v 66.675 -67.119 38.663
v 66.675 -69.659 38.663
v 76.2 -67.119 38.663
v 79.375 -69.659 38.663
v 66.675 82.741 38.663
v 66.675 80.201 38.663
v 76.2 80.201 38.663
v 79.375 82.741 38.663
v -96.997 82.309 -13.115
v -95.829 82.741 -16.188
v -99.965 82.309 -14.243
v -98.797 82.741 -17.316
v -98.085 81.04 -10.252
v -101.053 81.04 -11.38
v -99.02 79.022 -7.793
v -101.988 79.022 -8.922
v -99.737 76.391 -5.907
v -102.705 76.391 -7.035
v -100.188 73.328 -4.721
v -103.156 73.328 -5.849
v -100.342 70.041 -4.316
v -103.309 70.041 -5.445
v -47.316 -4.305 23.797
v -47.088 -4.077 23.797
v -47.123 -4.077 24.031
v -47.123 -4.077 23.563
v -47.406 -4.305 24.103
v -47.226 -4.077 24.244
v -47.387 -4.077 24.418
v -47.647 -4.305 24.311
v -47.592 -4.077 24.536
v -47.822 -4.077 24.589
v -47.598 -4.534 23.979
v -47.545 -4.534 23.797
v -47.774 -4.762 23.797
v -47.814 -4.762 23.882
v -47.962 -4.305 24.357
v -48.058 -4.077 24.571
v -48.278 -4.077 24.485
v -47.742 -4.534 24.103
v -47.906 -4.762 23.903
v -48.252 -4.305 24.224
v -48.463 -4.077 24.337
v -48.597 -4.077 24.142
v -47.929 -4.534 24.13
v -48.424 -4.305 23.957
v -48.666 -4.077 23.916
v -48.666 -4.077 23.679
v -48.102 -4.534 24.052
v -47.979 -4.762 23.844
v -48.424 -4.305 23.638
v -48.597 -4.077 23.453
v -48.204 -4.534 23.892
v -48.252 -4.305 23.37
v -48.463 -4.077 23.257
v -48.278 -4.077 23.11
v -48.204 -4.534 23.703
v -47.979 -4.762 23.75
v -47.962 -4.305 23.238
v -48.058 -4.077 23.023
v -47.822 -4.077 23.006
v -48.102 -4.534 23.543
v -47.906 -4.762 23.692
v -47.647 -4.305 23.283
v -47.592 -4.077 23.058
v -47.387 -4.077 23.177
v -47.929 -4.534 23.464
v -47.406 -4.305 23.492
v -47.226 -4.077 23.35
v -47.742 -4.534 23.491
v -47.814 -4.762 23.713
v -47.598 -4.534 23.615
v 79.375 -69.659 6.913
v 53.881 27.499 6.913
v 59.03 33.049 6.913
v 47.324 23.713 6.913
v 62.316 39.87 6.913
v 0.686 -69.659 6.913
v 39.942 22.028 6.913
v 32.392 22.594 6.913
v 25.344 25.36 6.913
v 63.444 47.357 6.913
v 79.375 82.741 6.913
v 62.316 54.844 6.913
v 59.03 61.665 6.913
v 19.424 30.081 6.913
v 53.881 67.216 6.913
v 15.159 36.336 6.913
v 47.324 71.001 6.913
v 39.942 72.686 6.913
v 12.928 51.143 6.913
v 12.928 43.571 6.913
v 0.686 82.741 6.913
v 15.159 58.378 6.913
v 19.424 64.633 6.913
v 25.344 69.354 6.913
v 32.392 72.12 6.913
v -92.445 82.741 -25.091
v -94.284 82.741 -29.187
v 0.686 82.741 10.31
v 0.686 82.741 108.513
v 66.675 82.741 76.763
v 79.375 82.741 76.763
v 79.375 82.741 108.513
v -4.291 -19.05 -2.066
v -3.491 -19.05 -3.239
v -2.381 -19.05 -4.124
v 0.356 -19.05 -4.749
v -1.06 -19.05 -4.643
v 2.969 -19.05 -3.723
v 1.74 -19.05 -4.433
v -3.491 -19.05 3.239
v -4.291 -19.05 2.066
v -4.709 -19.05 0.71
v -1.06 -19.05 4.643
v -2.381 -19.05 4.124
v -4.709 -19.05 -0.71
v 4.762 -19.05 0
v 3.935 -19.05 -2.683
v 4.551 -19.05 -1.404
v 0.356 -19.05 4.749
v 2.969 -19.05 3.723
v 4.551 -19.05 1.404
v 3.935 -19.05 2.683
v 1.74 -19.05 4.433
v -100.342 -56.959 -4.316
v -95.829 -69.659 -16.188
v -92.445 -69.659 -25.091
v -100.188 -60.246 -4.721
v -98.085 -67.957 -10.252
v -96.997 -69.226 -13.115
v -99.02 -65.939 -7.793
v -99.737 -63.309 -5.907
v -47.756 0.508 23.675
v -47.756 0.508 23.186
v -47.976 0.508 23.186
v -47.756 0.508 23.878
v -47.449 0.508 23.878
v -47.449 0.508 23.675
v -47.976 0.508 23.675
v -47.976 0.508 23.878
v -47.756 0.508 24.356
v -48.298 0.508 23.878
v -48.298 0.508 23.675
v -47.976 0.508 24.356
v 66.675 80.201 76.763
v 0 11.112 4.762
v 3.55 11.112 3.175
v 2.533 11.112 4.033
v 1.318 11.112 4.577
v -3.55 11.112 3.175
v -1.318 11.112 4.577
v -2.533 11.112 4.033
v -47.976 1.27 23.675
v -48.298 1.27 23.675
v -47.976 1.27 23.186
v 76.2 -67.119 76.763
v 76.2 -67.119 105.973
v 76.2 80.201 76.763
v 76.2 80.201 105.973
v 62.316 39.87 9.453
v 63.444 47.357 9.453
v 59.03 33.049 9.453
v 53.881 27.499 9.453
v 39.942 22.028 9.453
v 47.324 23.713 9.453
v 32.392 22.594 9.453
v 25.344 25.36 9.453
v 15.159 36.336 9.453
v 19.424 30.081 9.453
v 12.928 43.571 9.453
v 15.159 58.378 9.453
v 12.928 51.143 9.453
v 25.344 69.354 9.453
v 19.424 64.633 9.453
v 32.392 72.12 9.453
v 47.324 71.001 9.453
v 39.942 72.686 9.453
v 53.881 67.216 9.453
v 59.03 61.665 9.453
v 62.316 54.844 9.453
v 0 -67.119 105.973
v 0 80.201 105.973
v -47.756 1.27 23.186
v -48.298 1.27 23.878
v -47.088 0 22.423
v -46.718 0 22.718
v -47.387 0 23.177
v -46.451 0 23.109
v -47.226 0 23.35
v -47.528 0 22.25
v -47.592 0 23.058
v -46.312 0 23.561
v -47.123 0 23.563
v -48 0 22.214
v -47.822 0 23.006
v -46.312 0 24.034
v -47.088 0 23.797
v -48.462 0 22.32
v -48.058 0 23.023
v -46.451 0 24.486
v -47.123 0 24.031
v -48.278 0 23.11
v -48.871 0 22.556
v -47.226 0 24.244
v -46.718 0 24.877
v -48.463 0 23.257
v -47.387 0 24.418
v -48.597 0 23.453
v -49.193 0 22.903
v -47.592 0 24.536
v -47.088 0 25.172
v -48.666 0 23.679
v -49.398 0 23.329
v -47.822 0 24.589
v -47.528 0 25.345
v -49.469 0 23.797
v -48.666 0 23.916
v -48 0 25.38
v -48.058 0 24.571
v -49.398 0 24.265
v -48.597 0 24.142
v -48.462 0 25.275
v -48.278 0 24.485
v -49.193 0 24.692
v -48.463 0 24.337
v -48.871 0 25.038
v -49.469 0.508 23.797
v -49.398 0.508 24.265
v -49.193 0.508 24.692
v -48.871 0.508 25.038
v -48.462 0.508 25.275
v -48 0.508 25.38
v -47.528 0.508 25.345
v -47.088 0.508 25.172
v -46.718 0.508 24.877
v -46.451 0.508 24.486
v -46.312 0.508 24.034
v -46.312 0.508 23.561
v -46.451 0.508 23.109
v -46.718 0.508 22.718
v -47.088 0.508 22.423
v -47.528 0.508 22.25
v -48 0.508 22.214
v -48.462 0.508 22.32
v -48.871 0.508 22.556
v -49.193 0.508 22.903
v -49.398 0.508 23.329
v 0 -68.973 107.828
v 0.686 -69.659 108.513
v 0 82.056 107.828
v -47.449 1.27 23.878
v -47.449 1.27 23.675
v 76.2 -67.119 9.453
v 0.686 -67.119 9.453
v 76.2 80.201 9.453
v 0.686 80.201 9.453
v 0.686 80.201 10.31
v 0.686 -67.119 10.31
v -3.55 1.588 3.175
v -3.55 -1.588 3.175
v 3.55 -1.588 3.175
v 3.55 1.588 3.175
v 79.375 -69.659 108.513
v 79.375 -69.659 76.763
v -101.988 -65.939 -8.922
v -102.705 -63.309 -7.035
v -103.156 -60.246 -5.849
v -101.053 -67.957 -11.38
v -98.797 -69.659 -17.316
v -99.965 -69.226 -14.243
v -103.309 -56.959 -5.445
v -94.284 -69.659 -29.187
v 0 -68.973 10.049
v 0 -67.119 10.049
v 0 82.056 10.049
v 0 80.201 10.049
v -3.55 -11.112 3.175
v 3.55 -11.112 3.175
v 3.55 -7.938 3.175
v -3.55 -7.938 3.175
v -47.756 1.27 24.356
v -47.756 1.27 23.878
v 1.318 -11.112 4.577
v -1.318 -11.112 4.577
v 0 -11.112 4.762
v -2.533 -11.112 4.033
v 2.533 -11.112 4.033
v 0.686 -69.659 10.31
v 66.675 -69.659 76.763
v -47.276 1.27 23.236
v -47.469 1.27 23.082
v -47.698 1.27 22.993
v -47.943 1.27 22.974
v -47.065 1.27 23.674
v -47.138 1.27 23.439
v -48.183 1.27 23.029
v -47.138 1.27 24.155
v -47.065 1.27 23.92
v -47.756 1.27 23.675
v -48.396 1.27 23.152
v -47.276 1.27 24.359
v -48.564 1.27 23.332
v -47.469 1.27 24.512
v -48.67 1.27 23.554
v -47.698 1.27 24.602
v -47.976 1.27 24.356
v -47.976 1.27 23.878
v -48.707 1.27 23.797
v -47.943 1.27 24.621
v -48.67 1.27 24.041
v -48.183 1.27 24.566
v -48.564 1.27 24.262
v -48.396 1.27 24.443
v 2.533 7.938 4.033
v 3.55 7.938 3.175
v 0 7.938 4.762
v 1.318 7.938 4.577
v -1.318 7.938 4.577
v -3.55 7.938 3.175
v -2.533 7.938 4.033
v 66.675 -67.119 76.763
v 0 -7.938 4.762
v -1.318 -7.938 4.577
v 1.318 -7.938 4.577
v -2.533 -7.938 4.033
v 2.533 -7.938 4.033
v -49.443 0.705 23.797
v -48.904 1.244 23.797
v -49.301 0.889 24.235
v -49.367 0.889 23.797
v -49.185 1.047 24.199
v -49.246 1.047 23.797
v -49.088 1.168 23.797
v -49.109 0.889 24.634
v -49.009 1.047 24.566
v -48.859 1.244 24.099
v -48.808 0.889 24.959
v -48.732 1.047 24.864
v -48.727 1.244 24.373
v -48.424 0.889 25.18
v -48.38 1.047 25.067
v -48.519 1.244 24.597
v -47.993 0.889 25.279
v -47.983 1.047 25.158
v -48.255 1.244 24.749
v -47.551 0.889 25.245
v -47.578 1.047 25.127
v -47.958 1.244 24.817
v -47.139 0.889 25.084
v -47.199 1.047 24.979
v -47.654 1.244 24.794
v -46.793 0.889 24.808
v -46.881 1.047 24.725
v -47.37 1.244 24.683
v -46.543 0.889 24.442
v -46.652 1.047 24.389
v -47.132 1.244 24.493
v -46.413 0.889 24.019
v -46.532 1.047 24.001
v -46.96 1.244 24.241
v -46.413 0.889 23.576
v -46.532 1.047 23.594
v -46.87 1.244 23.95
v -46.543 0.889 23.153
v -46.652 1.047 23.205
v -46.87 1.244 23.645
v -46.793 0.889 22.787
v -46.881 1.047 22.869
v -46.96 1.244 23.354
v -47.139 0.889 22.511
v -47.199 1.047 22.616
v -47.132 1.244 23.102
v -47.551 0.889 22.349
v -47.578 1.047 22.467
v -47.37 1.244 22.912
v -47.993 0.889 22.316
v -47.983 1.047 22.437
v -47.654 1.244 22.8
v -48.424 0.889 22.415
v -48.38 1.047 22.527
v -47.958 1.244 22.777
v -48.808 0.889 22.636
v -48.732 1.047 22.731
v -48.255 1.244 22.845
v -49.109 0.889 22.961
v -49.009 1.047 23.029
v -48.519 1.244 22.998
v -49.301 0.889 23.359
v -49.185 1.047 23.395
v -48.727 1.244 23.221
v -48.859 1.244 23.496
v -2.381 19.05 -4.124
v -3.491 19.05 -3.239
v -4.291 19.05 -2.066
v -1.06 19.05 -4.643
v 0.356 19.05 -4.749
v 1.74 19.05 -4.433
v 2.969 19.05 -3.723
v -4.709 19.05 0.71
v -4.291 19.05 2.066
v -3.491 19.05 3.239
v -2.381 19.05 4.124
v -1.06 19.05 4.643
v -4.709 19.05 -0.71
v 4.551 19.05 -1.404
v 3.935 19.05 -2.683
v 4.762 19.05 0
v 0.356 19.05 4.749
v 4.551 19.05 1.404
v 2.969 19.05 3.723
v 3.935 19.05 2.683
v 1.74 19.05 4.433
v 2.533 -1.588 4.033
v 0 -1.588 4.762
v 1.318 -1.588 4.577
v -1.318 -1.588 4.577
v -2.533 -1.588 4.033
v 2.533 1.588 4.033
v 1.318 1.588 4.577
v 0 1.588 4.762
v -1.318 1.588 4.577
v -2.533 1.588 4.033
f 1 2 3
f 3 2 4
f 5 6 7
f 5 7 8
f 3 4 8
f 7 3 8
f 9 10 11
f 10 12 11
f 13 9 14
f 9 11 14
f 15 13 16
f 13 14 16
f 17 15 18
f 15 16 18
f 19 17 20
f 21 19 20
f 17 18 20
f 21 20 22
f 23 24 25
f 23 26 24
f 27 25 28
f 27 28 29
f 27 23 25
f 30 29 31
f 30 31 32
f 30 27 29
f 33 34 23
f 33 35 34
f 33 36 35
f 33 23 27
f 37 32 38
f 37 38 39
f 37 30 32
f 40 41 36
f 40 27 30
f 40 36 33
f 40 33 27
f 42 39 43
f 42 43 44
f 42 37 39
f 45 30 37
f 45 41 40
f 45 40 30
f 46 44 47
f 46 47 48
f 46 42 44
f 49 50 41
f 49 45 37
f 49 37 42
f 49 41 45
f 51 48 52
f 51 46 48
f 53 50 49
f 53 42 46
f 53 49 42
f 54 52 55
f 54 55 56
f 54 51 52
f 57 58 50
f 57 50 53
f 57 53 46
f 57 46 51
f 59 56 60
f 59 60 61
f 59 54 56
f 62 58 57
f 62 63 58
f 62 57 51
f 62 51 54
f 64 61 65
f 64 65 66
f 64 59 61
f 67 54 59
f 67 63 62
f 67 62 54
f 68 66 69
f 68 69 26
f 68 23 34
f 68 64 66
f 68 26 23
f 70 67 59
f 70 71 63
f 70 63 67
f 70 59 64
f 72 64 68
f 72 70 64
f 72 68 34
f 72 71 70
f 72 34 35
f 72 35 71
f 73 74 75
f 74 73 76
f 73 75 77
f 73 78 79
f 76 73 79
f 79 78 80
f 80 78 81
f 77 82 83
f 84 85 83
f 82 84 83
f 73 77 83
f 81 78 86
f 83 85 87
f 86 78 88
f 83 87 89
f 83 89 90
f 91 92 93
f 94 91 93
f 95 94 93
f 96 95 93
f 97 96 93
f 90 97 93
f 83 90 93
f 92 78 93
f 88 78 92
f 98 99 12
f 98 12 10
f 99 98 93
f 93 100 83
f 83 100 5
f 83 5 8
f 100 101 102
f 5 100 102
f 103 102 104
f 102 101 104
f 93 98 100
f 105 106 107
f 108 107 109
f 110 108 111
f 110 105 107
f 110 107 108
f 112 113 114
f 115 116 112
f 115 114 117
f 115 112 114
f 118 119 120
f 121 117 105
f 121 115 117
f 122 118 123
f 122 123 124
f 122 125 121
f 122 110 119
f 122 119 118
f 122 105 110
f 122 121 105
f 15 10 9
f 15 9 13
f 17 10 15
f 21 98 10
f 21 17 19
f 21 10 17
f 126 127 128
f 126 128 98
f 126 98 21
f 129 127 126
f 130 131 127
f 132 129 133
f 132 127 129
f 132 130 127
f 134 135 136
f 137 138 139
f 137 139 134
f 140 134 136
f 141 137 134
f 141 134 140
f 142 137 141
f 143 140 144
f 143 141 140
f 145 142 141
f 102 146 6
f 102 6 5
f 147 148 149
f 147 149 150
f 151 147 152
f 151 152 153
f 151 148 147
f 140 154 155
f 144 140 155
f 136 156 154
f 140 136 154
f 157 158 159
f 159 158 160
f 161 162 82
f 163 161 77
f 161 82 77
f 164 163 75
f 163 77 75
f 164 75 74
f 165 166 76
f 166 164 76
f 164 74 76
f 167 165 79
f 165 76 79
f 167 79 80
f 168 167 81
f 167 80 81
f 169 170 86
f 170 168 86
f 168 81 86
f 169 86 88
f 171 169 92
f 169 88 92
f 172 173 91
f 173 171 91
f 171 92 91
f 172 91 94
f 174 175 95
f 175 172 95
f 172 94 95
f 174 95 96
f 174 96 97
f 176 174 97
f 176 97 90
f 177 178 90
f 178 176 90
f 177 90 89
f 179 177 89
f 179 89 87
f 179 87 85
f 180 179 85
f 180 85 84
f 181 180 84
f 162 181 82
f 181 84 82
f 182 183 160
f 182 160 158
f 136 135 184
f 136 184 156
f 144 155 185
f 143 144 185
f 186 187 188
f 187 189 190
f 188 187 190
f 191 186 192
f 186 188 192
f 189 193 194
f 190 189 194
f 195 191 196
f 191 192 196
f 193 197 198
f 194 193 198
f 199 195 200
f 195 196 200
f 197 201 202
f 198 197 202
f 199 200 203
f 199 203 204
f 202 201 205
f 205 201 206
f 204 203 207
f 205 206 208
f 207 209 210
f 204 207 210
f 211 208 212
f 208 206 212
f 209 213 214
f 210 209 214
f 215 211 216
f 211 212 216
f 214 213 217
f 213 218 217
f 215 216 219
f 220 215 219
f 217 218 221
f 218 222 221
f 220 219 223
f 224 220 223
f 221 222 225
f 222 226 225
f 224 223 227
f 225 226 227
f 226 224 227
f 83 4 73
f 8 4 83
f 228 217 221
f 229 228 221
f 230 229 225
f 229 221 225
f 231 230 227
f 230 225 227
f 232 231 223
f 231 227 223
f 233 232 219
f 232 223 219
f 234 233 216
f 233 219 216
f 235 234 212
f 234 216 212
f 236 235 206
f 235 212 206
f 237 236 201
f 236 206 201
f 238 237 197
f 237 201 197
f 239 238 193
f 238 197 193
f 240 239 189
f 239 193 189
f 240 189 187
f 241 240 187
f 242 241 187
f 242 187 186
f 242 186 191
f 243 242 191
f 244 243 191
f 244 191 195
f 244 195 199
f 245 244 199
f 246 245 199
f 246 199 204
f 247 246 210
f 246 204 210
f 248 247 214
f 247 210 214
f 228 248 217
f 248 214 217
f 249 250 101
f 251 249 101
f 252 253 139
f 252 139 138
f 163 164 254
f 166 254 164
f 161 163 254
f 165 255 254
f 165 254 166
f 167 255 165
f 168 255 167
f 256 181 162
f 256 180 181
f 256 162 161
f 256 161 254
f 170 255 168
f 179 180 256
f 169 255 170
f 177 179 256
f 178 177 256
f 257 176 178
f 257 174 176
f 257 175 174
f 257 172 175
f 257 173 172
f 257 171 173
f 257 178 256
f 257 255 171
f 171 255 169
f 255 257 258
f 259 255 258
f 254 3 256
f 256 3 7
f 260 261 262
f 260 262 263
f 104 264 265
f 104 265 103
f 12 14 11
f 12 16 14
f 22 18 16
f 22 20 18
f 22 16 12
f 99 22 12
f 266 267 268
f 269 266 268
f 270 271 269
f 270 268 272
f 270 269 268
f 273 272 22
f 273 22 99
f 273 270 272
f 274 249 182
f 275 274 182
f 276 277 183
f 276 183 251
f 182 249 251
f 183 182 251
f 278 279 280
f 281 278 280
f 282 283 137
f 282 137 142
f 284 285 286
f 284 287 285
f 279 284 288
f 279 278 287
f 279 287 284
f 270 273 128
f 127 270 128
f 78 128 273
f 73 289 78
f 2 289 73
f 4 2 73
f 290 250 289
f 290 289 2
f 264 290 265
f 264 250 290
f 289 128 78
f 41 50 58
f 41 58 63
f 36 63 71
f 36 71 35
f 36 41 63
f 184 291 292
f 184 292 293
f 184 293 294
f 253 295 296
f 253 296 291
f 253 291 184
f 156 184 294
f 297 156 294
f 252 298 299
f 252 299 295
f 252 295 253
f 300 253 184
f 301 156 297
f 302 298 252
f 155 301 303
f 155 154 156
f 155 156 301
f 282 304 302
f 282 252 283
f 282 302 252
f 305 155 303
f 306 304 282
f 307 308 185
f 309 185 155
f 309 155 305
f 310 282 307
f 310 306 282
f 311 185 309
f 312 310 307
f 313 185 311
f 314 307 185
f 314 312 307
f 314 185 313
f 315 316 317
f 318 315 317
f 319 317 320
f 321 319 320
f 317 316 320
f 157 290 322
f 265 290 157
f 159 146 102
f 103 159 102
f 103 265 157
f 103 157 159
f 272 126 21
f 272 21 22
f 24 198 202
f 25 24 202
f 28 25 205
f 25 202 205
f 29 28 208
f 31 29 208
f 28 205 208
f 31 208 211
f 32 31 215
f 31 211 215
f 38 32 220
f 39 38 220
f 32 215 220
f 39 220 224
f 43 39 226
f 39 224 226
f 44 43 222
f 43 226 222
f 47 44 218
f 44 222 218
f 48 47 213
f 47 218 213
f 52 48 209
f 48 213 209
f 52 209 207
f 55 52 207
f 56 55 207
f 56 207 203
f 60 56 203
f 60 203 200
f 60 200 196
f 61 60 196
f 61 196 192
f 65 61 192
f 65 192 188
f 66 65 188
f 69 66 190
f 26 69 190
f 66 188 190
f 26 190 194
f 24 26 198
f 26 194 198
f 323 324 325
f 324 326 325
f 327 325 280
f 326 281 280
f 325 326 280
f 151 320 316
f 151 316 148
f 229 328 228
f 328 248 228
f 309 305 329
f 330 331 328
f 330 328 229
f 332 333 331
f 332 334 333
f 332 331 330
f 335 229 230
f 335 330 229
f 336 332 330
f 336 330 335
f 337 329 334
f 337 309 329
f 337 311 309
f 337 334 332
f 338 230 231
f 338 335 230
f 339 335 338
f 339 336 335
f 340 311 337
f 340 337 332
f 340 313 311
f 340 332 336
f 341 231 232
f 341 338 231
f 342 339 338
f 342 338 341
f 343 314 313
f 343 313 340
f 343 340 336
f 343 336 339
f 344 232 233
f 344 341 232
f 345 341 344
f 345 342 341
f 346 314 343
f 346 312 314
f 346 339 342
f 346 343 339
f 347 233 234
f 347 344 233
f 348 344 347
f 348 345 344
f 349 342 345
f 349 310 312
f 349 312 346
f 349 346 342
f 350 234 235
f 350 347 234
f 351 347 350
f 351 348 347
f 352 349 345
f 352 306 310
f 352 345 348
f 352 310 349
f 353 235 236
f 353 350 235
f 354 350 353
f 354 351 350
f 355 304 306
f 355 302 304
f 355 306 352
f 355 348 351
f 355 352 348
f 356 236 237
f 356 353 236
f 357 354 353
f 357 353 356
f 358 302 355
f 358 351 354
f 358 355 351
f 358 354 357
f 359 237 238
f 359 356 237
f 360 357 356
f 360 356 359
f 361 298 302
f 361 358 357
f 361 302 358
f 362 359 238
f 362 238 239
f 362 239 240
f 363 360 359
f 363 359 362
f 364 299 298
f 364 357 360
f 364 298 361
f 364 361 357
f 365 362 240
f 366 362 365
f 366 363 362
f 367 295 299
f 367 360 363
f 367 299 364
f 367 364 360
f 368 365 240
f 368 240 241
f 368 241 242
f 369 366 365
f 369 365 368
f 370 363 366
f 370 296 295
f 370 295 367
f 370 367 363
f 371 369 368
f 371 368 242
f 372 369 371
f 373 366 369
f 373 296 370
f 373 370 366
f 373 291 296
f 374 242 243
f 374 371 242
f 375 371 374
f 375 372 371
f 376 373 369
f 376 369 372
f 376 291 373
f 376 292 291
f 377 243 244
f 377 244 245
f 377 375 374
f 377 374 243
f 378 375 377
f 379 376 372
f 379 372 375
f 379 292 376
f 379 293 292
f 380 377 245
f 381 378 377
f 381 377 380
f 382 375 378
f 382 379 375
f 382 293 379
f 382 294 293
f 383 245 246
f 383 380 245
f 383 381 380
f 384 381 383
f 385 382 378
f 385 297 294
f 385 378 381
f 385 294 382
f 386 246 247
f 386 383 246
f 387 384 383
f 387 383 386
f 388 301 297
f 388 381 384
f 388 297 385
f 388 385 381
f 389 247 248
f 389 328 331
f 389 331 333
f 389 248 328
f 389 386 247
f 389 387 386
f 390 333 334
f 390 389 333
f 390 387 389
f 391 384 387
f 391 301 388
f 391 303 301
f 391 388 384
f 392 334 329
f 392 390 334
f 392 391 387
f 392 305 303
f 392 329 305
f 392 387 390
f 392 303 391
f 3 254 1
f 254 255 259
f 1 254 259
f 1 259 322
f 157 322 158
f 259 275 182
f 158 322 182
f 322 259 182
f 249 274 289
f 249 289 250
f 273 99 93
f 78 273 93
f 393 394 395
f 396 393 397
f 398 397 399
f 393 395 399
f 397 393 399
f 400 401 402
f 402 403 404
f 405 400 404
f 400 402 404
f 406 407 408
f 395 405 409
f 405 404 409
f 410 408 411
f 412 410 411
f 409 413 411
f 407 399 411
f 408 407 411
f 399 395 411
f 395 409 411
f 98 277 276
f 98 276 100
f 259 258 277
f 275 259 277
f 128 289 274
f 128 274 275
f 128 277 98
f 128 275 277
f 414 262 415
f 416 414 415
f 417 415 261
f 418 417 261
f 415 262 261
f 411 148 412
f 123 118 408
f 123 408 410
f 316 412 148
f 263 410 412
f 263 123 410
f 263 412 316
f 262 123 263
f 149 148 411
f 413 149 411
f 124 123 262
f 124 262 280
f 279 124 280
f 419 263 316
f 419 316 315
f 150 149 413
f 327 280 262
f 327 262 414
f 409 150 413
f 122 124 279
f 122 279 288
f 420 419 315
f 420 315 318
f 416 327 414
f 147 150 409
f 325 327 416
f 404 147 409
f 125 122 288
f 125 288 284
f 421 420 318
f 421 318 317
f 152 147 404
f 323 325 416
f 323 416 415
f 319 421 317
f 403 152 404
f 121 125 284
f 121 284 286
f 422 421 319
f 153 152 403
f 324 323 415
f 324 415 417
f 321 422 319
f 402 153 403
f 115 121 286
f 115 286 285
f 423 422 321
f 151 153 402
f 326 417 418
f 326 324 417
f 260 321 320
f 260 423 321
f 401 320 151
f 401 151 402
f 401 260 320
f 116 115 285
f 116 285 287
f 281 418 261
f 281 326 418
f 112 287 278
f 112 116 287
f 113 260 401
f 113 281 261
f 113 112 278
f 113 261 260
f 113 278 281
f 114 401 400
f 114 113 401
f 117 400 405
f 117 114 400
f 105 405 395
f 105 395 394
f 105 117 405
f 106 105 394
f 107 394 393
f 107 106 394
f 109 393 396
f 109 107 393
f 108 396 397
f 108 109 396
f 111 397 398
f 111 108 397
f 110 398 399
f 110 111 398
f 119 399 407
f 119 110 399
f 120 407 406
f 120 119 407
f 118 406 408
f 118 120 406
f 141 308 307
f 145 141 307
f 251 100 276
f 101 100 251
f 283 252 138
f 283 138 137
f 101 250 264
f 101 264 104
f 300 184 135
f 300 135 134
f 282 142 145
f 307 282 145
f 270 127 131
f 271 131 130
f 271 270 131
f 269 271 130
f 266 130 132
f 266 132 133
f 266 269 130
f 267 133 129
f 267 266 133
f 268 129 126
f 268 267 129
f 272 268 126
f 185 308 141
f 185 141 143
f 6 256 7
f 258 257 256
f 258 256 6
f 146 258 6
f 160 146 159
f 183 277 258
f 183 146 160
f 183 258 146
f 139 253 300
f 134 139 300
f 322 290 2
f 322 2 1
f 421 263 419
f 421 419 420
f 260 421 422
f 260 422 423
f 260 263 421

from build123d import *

# Parameters (mm, degrees)
F0_R       = 4.7625
F1_DEPTH   = 19.05
F2_W       = 3.175
F2_H       = 3.3072910916
F3_DEPTH   = 12.7
F4_W       = 152.4
F4_H       = 101.6
F5_DEPTH   = 76.2
F6_T       = -2.54
F7_W       = 152.4
F7_H       = 101.6
F8_DEPTH   = 3.175
F9_W       = 177.8
F9_H       = 38.1
F10_DEPTH  = 12.7
F11_R      = 25.4
F12_DEPTH  = 25.4
F13_R      = 0.79375
F14_DEPTH  = 4.7625
F15_SIZE   = 0.6858
F15_2_SIZE = 0.6858
F16_R      = 1.5875
F17_DEPTH  = 1.27
F18_R      = 0.762
F19_W      = 0.2193674445
F19_H      = 1.16994977
F20_DEPTH  = 0.762
F21_W      = 0.8484892041
F21_H      = 0.2032797784
F22_DEPTH  = 0.762
F24_W      = 147.32
F24_H      = 96.52
F25_DEPTH  = 25.4
F27_DEPTH  = 152.4
F28_R      = 12.7


with BuildPart() as f1:
    # F0 (on Front) → F1 (new body, symmetric)
    with BuildSketch(Plane.XZ):
        Circle(F0_R)
    extrude(amount=F1_DEPTH, both=True)

    # F2 (on Right) → F3 (cut, symmetric)
    with BuildSketch(Plane.YZ):
        with Locations((0, 4.8286455458)):
            Rectangle(F2_W, F2_H)
        with Locations((9.525, 4.8286455458)):
            Rectangle(F2_W, F2_H)
        with Locations((-9.525, 4.8286455458)):
            Rectangle(F2_W, F2_H)
    extrude(amount=F3_DEPTH, both=True, mode=Mode.SUBTRACT)


with BuildPart() as f5:
    # F4 (on Right) → F5 (new body)
    with BuildSketch(Plane.YZ):
        with Locations((6.5414318815, 57.7133724002)):
            Rectangle(F4_W, F4_H)
    extrude(amount=F5_DEPTH)

    # F6
    f6_openings = [f5.faces().sort_by_distance(p)[0] for p in [
        (76.2, 6.541432, 57.713372),
    ]]
    offset(amount=F6_T, openings=f6_openings)

    # F7 (on face) → F8 (join)
    with BuildSketch(Plane.YZ.offset(76.2)):
        with Locations((6.5414318815, 57.7133724002)):
            Rectangle(F7_W, F7_H)
    extrude(amount=F8_DEPTH)

    # F9 (on face) → F10 (cut)
    with BuildSketch(Plane.YZ.offset(79.375)):
        with Locations((6.8365962322, 57.7133724002)):
            Rectangle(F9_W, F9_H)
    extrude(amount=-F10_DEPTH, mode=Mode.SUBTRACT)

    # F11 (on face) → F12 (cut)
    with BuildSketch(Plane(origin=(0, 0, 6.9133724002), x_dir=(1, 0, 0), z_dir=(0, 0, -1))):
        with Locations((38.0439981818, -47.3570302129)):
            Circle(F11_R)
    extrude(amount=-F12_DEPTH, mode=Mode.SUBTRACT)

    # F15#2
    f15_2_edges = [f5.edges().sort_by_distance(p)[0] for p in [
        (0, 82.741432, 57.713372),
        (0, 6.541432, 108.513372),
        (0, -69.658568, 57.713372),
        (0, 6.541432, 6.913372),
    ]]
    chamfer(f15_2_edges, length=F15_2_SIZE)

    # F24 (on face) → F25 (cut)
    with BuildSketch(Plane(origin=(0, 0, 0), x_dir=(0, -1, 0), z_dir=(-1, 0, 0))):
        with Locations((-6.5414318815, 57.7133724002)):
            Rectangle(F24_W, F24_H)
    extrude(amount=-F25_DEPTH, mode=Mode.SUBTRACT)

    # F26 (on face) → F27 (join, through all)
    with BuildSketch(Plane.XZ.offset(69.6585681185)):
        Polygon((-94.2842701869, -29.1871230077), (0.6858, 6.9133724002), (0.6858, 10.3100214641), (-92.4445959751, -25.0911678329), (-100.3415793455, -4.3164649795), (-103.3093940389, -5.444605461), align=None)
    extrude(amount=-F27_DEPTH)

    # F28
    f28_edges = [f5.edges().sort_by_distance(p)[0] for p in [
        (-101.825487, 82.741432, -4.880535),
        (-101.825487, -69.658568, -4.880535),
    ]]
    fillet(f28_edges, radius=F28_R)


with BuildPart() as f14:
    # F13 (on Front) → F14 (new body)
    with BuildSketch(Plane.XZ):
        with Locations((-47.8815212846, 23.7973220646)):
            Circle(F13_R)
    extrude(amount=F14_DEPTH)

    # F15
    f15_edges = [f14.edges().sort_by_distance(p)[0] for p in [
        (-48.675271, -4.7625, 23.797322),
    ]]
    chamfer(f15_edges, length=F15_SIZE)

    # F16 (on face) → F17 (join)
    with BuildSketch(Plane(origin=(0, 0, 0), x_dir=(-1, 0, 0), z_dir=(0, 1, 0))):
        with Locations((47.8815212846, 23.7973220646)):
            Circle(F16_R)
    extrude(amount=F17_DEPTH)

    # F18
    f18_edges = [f14.edges().sort_by_distance(p)[0] for p in [
        (-46.294021, 1.27, 23.797322),
    ]]
    fillet(f18_edges, radius=F18_R)

    # F19 (on face) → F20 (cut)
    with BuildSketch(Plane(origin=(0, 1.27, 0), x_dir=(-1, 0, 0), z_dir=(0, 1, 0))):
        with Locations((47.8660054505, 23.7711463124)):
            Rectangle(F19_W, F19_H)
    extrude(amount=-F20_DEPTH, mode=Mode.SUBTRACT)

    # F21 (on face) → F22 (cut)
    with BuildSketch(Plane(origin=(0, 1.27, 0), x_dir=(-1, 0, 0), z_dir=(0, 1, 0))):
        with Locations((47.8733357295, 23.7765004858)):
            Rectangle(F21_W, F21_H)
    extrude(amount=-F22_DEPTH, mode=Mode.SUBTRACT)


solid = Compound([f1.part, f5.part, f14.part])
